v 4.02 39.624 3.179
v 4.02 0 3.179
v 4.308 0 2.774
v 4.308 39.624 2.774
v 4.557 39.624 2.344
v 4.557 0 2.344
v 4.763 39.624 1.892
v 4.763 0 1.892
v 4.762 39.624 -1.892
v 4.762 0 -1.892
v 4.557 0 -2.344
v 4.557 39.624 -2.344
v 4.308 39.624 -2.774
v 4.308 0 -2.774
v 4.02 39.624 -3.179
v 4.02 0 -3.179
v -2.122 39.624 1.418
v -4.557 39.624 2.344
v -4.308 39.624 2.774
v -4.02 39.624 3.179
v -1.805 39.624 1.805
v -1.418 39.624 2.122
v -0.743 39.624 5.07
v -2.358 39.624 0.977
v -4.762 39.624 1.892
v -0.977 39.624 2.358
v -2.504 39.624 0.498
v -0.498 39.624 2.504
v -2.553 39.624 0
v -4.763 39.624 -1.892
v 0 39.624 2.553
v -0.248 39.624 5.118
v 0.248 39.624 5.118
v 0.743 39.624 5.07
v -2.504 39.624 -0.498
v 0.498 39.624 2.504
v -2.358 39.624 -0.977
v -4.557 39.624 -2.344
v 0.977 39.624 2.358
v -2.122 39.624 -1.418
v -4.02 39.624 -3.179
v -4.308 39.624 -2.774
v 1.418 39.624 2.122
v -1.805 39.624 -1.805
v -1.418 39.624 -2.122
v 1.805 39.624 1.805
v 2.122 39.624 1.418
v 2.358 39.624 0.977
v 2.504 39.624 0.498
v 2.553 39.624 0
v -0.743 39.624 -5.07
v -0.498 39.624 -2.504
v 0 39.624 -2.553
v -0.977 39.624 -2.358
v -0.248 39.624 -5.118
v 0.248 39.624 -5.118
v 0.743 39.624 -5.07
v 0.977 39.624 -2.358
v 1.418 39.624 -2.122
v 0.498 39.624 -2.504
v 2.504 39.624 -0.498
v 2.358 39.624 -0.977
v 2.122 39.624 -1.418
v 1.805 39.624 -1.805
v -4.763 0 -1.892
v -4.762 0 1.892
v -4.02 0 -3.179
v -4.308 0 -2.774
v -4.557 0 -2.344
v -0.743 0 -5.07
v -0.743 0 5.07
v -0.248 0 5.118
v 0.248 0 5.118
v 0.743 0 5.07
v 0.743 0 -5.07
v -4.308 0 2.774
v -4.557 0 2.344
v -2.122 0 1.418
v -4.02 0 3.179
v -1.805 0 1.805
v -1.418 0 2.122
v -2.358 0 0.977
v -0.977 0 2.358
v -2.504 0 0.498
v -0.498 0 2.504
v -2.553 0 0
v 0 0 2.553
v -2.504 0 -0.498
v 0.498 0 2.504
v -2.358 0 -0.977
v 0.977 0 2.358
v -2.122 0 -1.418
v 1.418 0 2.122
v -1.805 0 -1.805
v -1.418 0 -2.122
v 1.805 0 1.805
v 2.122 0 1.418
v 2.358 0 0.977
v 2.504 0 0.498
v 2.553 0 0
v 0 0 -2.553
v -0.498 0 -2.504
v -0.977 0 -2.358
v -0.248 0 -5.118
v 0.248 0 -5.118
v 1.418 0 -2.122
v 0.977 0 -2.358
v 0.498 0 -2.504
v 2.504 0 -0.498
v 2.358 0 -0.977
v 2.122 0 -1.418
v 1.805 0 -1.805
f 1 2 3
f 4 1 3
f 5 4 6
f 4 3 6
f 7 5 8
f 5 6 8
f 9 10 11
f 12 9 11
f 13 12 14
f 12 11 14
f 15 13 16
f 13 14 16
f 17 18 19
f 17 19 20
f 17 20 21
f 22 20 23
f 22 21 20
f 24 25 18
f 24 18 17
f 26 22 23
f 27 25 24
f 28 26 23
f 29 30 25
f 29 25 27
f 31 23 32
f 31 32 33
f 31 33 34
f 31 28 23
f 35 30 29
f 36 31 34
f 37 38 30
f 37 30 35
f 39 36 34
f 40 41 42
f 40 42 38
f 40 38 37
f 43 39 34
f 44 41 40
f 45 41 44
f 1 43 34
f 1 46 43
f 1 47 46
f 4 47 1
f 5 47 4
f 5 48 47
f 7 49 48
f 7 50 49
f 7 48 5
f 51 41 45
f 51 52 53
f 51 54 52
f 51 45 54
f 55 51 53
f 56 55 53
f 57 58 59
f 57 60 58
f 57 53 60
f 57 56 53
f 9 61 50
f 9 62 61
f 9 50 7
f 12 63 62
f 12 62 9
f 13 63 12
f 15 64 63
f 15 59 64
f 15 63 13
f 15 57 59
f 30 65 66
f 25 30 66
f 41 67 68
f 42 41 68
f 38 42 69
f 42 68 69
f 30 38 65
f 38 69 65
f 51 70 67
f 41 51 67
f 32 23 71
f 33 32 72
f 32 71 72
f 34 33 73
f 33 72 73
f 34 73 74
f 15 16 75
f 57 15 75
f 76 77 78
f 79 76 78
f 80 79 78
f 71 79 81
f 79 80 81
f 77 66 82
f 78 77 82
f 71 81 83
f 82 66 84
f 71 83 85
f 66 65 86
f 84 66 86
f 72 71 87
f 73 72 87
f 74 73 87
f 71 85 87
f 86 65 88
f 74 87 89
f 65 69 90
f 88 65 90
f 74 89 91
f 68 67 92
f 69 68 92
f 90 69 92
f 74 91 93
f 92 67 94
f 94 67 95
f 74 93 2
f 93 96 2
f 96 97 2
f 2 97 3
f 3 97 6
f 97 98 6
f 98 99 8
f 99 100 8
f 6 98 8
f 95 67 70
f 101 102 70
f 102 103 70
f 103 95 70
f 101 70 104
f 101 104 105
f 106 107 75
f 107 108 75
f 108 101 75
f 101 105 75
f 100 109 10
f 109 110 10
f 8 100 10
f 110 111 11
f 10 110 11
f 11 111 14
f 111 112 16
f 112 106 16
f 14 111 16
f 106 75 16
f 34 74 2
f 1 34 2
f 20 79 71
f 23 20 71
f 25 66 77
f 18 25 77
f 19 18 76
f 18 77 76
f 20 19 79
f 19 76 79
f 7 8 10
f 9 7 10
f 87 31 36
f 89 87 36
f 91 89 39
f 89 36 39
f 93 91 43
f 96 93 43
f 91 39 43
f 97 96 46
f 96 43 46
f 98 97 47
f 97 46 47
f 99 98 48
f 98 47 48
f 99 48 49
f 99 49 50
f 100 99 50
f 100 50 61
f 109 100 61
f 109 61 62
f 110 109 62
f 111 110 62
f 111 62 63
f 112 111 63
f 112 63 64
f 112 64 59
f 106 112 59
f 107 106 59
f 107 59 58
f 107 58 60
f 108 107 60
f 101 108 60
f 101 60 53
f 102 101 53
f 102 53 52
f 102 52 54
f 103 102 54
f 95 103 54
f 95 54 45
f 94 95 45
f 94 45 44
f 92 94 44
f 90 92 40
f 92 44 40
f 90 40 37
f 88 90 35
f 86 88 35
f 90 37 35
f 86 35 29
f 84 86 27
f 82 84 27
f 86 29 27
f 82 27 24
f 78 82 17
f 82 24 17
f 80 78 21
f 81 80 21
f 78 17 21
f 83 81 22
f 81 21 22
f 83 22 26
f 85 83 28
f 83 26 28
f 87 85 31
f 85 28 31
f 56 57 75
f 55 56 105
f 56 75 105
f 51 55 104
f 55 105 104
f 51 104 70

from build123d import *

# Parameters (mm, degrees)
BOSS_EXTRUDE1_DEPTH = 39.624
SKETCH2_R           = 2.5527
CUT_EXTRUDE1_DEPTH  = 41.236833499


with BuildPart() as part:
    # Sketch1 → Boss-Extrude1 (new body)
    with BuildSketch(Plane(origin=(0, 0, 0), x_dir=(1, 0, 0), z_dir=(0, 1, 0))):
        with BuildLine():
            Line((-0.742977689, 5.070302945), (-4.019522311, 3.178589026))
            ThreePointArc((-4.019522311, 3.178589026), (-4.43790388, 2.562225), (-4.7625, 1.891713919))
            Line((-4.7625, 1.891713919), (-4.7625, -1.891713919))
            ThreePointArc((-4.7625, -1.891713919), (-4.43790388, -2.562225), (-4.019522311, -3.178589026))
            Line((-4.019522311, -3.178589026), (-0.742977689, -5.070302945))
            ThreePointArc((-0.742977689, -5.070302945), (0, -5.12445), (0.742977689, -5.070302945))
            Line((0.742977689, -5.070302945), (4.019522311, -3.178589026))
            ThreePointArc((4.019522311, -3.178589026), (4.43790388, -2.562225), (4.7625, -1.891713919))
            Line((4.7625, -1.891713919), (4.7625, 1.891713919))
            ThreePointArc((4.7625, 1.891713919), (4.43790388, 2.562225), (4.019522311, 3.178589026))
            Line((4.019522311, 3.178589026), (0.742977689, 5.070302945))
            ThreePointArc((0.742977689, 5.070302945), (0, 5.12445), (-0.742977689, 5.070302945))
        make_face()
    extrude(amount=BOSS_EXTRUDE1_DEPTH)

    # Sketch2 → Cut-Extrude1 (cut, through all)
    with BuildSketch(Plane(origin=(0, 39.624, 0), x_dir=(1, 0, 0), z_dir=(0, 1, 0))):
        with Locations(Location((0, 0, 0), (0, 0, 270))):
            Circle(SKETCH2_R)
    extrude(amount=-CUT_EXTRUDE1_DEPTH, mode=Mode.SUBTRACT)


solid = part.part
